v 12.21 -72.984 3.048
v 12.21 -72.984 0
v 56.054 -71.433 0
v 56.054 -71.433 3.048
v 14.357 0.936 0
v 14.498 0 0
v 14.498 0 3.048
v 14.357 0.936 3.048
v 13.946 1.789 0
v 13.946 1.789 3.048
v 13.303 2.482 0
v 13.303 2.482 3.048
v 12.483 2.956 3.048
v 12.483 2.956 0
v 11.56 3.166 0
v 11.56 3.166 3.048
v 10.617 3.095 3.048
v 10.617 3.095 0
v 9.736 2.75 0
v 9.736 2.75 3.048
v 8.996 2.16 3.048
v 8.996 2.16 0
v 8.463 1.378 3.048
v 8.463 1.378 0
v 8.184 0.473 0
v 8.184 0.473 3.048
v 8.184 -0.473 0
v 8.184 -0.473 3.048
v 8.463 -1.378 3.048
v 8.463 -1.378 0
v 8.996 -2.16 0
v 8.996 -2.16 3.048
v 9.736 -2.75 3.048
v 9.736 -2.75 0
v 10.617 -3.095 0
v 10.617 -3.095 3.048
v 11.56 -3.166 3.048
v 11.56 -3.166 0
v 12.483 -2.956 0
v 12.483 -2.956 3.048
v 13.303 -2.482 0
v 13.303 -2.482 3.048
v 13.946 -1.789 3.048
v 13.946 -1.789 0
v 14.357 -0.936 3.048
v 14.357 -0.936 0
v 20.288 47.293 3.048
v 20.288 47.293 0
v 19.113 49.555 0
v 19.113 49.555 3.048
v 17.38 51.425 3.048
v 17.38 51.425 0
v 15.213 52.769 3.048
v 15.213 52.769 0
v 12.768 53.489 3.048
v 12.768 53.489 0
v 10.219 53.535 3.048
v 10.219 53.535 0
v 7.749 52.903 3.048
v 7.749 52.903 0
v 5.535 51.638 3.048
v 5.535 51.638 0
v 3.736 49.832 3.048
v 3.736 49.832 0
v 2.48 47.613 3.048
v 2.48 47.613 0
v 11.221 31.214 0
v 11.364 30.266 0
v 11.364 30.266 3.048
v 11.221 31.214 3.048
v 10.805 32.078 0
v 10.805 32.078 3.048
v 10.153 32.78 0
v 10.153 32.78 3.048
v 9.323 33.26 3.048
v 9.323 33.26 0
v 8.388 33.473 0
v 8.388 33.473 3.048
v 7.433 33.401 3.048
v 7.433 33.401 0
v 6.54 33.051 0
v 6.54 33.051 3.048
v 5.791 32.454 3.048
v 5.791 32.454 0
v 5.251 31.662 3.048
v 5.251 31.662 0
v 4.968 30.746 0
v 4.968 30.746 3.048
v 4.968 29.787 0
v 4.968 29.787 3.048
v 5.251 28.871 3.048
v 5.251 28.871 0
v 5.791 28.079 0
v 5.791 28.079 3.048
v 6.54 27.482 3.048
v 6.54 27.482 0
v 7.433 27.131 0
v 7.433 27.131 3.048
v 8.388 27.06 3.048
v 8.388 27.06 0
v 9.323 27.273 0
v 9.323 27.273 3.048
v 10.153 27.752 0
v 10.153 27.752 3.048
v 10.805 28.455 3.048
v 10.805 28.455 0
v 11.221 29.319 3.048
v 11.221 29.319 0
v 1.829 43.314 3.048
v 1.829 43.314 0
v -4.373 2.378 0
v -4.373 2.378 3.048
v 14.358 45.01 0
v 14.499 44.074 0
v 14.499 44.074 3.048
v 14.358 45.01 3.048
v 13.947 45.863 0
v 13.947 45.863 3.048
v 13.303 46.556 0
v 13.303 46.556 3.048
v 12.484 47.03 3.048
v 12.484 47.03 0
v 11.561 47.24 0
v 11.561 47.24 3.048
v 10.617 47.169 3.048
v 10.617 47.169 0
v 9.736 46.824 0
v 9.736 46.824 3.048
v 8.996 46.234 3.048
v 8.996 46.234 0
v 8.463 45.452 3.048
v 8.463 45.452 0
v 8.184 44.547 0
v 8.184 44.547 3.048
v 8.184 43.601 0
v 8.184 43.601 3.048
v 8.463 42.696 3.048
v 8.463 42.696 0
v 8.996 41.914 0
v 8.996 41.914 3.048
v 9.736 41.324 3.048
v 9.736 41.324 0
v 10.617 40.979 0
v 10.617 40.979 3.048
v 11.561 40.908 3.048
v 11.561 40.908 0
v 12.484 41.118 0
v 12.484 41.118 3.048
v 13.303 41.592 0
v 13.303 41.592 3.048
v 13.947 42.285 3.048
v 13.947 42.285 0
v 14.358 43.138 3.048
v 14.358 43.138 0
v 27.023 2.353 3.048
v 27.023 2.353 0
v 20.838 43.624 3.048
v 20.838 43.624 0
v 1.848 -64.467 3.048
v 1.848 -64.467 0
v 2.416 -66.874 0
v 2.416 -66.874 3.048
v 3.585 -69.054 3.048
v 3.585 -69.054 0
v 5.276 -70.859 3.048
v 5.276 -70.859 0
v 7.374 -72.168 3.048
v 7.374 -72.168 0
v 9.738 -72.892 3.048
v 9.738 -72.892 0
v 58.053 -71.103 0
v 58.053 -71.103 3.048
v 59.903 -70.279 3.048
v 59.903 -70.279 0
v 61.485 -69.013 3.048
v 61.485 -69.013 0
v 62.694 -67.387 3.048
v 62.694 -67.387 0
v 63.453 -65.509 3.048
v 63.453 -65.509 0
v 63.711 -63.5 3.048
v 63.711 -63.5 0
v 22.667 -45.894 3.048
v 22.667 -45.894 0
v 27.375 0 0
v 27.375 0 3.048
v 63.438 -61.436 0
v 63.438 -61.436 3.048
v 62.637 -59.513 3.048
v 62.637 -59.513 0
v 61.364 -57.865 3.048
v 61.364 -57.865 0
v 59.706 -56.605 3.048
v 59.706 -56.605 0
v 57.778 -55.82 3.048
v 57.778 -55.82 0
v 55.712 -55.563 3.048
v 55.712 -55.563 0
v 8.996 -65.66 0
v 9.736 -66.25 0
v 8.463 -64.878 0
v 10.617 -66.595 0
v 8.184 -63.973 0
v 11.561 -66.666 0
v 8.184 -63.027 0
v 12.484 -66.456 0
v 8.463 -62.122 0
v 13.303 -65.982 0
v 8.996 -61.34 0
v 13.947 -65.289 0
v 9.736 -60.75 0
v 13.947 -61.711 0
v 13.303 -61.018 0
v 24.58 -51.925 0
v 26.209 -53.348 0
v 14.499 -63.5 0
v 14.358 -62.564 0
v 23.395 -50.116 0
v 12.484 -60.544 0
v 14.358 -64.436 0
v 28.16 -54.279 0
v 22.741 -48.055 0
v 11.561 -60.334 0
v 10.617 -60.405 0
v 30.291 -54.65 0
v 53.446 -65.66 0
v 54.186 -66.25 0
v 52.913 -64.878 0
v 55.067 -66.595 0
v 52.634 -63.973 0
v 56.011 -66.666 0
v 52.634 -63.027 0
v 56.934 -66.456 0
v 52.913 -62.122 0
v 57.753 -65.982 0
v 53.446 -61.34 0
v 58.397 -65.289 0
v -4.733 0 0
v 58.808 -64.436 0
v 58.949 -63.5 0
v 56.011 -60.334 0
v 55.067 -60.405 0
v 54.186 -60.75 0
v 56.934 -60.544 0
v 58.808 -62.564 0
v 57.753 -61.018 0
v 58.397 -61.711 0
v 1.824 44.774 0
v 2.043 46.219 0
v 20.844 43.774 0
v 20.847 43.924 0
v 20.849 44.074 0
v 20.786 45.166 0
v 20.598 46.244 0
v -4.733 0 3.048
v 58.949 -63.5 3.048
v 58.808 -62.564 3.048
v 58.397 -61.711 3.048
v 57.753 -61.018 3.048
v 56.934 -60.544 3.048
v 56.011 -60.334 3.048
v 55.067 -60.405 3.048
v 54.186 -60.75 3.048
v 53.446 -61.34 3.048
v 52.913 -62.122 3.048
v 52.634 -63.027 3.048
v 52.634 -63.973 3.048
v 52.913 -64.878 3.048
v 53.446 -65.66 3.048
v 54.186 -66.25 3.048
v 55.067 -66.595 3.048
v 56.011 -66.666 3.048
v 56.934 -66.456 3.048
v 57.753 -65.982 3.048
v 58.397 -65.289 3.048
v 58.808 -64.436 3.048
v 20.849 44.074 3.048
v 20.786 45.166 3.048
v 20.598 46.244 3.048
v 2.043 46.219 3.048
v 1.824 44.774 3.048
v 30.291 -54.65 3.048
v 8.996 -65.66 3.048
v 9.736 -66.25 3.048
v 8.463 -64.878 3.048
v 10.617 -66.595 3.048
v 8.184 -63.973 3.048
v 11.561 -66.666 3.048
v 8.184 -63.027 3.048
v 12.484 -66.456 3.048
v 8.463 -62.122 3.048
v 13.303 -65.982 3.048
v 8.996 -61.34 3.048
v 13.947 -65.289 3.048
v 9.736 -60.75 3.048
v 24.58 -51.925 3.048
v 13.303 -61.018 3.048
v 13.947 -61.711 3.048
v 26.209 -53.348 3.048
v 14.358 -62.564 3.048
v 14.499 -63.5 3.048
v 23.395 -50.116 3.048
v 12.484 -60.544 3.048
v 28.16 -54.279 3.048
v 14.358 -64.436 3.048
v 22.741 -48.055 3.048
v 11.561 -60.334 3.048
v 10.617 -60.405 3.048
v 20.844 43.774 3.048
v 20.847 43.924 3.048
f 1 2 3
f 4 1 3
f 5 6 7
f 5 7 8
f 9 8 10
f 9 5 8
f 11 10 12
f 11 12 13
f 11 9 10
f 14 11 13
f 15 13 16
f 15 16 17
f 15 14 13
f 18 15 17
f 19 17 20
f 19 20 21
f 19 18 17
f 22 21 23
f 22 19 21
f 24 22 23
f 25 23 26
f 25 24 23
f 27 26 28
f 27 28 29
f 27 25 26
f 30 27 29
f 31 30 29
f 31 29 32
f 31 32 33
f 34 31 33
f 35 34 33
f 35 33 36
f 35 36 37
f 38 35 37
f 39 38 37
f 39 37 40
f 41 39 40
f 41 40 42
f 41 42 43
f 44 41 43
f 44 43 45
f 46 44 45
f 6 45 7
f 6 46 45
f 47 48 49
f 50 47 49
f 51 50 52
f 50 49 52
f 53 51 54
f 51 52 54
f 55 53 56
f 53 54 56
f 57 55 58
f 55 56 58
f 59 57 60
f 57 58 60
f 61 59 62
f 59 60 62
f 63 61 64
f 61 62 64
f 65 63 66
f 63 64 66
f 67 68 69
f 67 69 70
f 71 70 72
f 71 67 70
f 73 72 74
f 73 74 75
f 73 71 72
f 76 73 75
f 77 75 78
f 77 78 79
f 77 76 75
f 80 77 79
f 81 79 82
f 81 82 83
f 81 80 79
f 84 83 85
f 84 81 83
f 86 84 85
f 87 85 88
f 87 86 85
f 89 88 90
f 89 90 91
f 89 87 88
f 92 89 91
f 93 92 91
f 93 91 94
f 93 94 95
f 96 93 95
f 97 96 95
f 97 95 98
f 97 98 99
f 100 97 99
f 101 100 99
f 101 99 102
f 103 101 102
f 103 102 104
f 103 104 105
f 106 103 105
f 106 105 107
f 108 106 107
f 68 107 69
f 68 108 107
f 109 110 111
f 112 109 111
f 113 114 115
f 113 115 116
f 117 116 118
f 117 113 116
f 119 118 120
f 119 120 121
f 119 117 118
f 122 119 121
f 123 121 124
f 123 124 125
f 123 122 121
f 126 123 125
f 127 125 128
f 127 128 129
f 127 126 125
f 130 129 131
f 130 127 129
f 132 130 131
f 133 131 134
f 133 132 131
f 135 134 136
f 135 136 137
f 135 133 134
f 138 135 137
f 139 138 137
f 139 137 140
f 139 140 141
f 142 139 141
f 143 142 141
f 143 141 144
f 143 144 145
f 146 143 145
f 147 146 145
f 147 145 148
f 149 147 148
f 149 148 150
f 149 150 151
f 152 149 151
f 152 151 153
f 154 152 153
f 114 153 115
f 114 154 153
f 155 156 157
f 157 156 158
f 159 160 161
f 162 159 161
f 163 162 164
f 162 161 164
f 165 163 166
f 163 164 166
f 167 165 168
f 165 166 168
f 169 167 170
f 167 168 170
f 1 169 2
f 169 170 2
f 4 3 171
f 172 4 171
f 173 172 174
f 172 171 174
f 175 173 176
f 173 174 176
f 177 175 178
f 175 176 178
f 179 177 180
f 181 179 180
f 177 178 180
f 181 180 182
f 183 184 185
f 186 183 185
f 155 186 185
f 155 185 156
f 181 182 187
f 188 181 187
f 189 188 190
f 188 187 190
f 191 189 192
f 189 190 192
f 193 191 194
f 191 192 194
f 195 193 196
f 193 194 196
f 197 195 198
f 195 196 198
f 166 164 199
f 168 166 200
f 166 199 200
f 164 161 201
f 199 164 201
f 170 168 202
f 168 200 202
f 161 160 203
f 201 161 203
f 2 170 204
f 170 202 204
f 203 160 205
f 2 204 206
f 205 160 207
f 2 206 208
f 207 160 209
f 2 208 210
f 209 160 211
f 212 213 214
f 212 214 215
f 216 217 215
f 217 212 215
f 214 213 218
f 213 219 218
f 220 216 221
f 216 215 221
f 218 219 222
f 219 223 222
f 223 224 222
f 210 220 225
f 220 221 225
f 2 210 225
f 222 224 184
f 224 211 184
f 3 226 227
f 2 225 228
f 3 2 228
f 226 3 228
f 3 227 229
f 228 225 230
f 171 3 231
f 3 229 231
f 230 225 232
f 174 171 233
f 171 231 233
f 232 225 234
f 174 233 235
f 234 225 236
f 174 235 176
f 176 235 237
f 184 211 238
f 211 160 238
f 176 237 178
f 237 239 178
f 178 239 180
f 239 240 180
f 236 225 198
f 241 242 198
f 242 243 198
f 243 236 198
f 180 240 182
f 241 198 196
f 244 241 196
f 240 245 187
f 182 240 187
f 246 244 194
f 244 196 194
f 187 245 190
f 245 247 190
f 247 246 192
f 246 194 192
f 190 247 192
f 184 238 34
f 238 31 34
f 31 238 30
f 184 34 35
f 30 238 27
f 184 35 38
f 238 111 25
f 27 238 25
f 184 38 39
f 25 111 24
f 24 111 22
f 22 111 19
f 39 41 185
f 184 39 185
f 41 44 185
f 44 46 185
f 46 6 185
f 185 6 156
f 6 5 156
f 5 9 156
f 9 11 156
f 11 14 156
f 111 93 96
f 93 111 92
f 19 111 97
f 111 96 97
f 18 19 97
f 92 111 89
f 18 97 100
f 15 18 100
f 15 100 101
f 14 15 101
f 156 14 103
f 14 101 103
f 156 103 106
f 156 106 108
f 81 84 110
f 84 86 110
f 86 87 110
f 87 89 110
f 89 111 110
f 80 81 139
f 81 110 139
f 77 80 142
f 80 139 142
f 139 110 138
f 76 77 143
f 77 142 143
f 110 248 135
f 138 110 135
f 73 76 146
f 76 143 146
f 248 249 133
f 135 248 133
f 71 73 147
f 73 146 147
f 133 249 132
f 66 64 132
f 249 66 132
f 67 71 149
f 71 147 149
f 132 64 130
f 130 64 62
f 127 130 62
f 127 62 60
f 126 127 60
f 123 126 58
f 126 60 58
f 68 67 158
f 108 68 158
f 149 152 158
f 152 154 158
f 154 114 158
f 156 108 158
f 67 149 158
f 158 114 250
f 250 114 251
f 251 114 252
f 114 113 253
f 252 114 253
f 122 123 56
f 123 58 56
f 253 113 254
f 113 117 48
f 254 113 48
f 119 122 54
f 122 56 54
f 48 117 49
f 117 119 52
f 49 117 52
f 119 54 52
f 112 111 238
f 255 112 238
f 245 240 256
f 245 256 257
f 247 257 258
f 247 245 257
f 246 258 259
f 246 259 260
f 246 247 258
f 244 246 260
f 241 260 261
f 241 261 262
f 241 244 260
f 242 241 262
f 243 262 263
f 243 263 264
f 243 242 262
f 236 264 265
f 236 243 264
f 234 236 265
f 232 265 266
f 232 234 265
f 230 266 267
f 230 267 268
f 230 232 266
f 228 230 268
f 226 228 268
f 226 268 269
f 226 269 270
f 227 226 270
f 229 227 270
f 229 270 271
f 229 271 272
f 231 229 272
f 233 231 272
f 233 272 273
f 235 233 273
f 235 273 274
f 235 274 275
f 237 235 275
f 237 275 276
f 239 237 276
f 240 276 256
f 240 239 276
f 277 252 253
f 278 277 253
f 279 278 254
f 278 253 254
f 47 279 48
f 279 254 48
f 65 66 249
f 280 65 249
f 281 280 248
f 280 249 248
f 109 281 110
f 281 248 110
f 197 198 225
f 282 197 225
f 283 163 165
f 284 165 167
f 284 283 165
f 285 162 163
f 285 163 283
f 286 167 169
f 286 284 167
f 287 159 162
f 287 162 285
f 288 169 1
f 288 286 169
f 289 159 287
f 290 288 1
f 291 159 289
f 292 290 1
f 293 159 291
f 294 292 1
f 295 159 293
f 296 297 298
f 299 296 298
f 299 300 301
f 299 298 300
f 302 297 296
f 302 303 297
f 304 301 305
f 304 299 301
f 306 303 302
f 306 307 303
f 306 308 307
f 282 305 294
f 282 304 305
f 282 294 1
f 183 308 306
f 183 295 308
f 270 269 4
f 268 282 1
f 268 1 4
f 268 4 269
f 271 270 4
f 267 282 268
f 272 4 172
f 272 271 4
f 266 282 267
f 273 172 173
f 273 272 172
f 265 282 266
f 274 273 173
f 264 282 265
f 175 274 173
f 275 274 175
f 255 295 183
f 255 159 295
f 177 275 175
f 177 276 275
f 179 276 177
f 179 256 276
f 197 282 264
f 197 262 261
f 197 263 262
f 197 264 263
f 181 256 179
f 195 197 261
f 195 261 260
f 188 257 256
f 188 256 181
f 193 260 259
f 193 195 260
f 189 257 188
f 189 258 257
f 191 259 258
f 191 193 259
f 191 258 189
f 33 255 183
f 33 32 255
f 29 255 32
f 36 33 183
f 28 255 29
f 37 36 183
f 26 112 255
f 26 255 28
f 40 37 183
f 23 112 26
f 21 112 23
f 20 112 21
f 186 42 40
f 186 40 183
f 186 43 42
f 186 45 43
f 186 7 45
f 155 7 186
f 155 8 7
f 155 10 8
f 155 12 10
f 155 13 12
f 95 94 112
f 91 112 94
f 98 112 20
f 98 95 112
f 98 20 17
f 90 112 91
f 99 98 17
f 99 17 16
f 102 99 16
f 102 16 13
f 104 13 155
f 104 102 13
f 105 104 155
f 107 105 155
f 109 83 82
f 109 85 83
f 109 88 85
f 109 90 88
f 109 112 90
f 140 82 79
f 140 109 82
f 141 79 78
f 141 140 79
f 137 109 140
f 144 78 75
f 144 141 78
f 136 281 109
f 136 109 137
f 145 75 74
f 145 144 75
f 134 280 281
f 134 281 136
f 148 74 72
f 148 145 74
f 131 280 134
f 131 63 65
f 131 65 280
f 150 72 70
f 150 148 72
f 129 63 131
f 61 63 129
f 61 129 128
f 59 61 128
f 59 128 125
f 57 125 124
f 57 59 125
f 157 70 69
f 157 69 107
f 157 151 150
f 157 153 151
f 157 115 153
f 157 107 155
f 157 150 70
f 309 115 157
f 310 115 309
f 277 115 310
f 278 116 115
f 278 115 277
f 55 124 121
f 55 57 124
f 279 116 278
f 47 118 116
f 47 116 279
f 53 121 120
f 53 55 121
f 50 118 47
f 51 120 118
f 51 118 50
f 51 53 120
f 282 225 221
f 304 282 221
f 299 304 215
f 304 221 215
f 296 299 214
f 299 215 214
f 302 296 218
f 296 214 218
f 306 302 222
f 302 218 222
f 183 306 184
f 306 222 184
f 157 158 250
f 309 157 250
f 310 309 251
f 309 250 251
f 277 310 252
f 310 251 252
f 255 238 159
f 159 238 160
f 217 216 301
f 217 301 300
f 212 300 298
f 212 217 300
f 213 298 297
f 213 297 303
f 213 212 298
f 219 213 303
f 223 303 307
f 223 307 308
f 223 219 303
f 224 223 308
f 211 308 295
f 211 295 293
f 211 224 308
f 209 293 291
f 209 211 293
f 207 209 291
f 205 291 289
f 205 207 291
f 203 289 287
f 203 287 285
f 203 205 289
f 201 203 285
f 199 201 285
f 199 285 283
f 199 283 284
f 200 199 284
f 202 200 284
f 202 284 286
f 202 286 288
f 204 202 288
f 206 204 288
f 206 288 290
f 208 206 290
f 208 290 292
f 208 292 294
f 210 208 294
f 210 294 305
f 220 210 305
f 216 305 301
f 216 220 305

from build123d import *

# Parameters (mm, degrees)
F0_R     = 3.175
F0_R_2   = 3.2155850094
F1_DEPTH = 3.048


with BuildPart() as f1:
    # F0 (on Top) → F1 (new body)
    with BuildSketch(Plane.XY):
        with BuildLine():
            ThreePointArc((20.8380485389, 43.6243366756), (20.8460123248, 43.8490943624), (20.8486674135, 44.0739774213))
            ThreePointArc((20.8486674135, 44.0739774213), (20.7075310622, 45.7076016198), (20.2883045743, 47.2928134805))
            Line((20.2883045743, 47.2928134805), (20.8380485389, 43.6243366756))
        make_face()
        with BuildLine():
            Line((20.8380485389, 43.6243366756), (20.2883045743, 47.2928134805))
            ThreePointArc((20.2883045743, 47.2928134805), (11.4947007425, 53.5974417385), (2.4803889816, 47.6126285169))
            Line((2.4803889816, 47.6126285169), (1.8290711011, 43.3135394793))
            ThreePointArc((1.8290711011, 43.3135394793), (11.4793805601, 34.5502502929), (20.8380485389, 43.6243366756))
        make_face()
        with Locations((11.3236674135, 44.0739774213)):
            Circle(F0_R, mode=Mode.SUBTRACT)
        with BuildLine():
            Line((27.0228593645, 2.3526965767), (20.8380485389, 43.6243366756))
            ThreePointArc((20.8380485389, 43.6243366756), (11.4793805601, 34.5502502929), (1.8290711011, 43.3135394793))
            Line((1.8290711011, 43.3135394793), (-4.3727269733, 2.3779488711))
            ThreePointArc((-4.3727269733, 2.3779488711), (11.3359323796, 15.8749948649), (27.0228593645, 2.3526965767))
        make_face()
        with Locations((8.1481637045, 30.2663650364)):
            Circle(F0_R_2, mode=Mode.SUBTRACT)
        with BuildLine():
            Line((1.8290711011, 43.3135394793), (2.4803889816, 47.6126285169))
            ThreePointArc((2.4803889816, 47.6126285169), (1.9061330136, 45.5007467885), (1.8290711011, 43.3135394793))
        make_face()
        with BuildLine():
            Line((27.3754255146, 0), (27.0228593645, 2.3526965767))
            ThreePointArc((27.0228593645, 2.3526965767), (27.1542769566, 1.1796093414), (27.1981637045, 0))
            ThreePointArc((27.1981637045, 0), (10.1308213687, -15.8301593408), (-4.3727269733, 2.3779488711))
            Line((-4.3727269733, 2.3779488711), (-4.7329894859, 0))
            Line((-4.7329894859, 0), (1.8478131932, -64.4672828145))
            ThreePointArc((1.8478131932, -64.4672828145), (10.839303468, -53.9873184958), (20.8485711575, -63.5000000212))
            ThreePointArc((20.8485711575, -63.5000000212), (18.365147651, -69.9141894077), (12.2098676434, -72.9836756556))
            Line((12.2098676434, -72.9836756556), (56.0542108535, -71.4325372605))
            ThreePointArc((56.0542108535, -71.4325372605), (47.837920469, -63.6713312347), (55.7115808743, -55.5627420555))
            Line((55.7115808743, -55.5627420555), (30.2908926845, -54.6499382367))
            ThreePointArc((30.2908926845, -54.6499382367), (24.5800251587, -51.9251805627), (22.6674883506, -45.8935543113))
            Line((22.6674883506, -45.8935543113), (27.3754255146, 0))
        make_face()
        with BuildLine():
            ThreePointArc((27.1981637045, 0), (27.1542769566, 1.1796093414), (27.0228593645, 2.3526965767))
            ThreePointArc((27.0228593645, 2.3526965767), (11.3359323796, 15.8749948649), (-4.3727269733, 2.3779488711))
            ThreePointArc((-4.3727269733, 2.3779488711), (10.1308213687, -15.8301593408), (27.1981637045, 0))
        make_face()
        with Locations((11.3231637045, 0)):
            Circle(F0_R, mode=Mode.SUBTRACT)
        with BuildLine():
            ThreePointArc((20.8485711575, -63.5000000212), (10.839303468, -53.9873184958), (1.8478131932, -64.4672828145))
            ThreePointArc((1.8478131932, -64.4672828145), (5.2756831891, -70.8585784248), (12.2098676434, -72.9836756556))
            ThreePointArc((12.2098676434, -72.9836756556), (18.365147651, -69.9141894077), (20.8485711575, -63.5000000212))
        make_face()
        with Locations((11.3235711575, -63.5000000212)):
            Circle(F0_R, mode=Mode.SUBTRACT)
        with BuildLine():
            ThreePointArc((63.7110711578, -63.499999986), (61.364271399, -57.8654656607), (55.7115808743, -55.5627420555))
            ThreePointArc((55.7115808743, -55.5627420555), (47.837920469, -63.6713312347), (56.0542108535, -71.4325372605))
            ThreePointArc((56.0542108535, -71.4325372605), (61.4845904991, -69.0125460704), (63.7110711578, -63.499999986))
        make_face()
        with Locations((55.7735711578, -63.499999986)):
            Circle(F0_R, mode=Mode.SUBTRACT)
    extrude(amount=F1_DEPTH)


solid = f1.part
